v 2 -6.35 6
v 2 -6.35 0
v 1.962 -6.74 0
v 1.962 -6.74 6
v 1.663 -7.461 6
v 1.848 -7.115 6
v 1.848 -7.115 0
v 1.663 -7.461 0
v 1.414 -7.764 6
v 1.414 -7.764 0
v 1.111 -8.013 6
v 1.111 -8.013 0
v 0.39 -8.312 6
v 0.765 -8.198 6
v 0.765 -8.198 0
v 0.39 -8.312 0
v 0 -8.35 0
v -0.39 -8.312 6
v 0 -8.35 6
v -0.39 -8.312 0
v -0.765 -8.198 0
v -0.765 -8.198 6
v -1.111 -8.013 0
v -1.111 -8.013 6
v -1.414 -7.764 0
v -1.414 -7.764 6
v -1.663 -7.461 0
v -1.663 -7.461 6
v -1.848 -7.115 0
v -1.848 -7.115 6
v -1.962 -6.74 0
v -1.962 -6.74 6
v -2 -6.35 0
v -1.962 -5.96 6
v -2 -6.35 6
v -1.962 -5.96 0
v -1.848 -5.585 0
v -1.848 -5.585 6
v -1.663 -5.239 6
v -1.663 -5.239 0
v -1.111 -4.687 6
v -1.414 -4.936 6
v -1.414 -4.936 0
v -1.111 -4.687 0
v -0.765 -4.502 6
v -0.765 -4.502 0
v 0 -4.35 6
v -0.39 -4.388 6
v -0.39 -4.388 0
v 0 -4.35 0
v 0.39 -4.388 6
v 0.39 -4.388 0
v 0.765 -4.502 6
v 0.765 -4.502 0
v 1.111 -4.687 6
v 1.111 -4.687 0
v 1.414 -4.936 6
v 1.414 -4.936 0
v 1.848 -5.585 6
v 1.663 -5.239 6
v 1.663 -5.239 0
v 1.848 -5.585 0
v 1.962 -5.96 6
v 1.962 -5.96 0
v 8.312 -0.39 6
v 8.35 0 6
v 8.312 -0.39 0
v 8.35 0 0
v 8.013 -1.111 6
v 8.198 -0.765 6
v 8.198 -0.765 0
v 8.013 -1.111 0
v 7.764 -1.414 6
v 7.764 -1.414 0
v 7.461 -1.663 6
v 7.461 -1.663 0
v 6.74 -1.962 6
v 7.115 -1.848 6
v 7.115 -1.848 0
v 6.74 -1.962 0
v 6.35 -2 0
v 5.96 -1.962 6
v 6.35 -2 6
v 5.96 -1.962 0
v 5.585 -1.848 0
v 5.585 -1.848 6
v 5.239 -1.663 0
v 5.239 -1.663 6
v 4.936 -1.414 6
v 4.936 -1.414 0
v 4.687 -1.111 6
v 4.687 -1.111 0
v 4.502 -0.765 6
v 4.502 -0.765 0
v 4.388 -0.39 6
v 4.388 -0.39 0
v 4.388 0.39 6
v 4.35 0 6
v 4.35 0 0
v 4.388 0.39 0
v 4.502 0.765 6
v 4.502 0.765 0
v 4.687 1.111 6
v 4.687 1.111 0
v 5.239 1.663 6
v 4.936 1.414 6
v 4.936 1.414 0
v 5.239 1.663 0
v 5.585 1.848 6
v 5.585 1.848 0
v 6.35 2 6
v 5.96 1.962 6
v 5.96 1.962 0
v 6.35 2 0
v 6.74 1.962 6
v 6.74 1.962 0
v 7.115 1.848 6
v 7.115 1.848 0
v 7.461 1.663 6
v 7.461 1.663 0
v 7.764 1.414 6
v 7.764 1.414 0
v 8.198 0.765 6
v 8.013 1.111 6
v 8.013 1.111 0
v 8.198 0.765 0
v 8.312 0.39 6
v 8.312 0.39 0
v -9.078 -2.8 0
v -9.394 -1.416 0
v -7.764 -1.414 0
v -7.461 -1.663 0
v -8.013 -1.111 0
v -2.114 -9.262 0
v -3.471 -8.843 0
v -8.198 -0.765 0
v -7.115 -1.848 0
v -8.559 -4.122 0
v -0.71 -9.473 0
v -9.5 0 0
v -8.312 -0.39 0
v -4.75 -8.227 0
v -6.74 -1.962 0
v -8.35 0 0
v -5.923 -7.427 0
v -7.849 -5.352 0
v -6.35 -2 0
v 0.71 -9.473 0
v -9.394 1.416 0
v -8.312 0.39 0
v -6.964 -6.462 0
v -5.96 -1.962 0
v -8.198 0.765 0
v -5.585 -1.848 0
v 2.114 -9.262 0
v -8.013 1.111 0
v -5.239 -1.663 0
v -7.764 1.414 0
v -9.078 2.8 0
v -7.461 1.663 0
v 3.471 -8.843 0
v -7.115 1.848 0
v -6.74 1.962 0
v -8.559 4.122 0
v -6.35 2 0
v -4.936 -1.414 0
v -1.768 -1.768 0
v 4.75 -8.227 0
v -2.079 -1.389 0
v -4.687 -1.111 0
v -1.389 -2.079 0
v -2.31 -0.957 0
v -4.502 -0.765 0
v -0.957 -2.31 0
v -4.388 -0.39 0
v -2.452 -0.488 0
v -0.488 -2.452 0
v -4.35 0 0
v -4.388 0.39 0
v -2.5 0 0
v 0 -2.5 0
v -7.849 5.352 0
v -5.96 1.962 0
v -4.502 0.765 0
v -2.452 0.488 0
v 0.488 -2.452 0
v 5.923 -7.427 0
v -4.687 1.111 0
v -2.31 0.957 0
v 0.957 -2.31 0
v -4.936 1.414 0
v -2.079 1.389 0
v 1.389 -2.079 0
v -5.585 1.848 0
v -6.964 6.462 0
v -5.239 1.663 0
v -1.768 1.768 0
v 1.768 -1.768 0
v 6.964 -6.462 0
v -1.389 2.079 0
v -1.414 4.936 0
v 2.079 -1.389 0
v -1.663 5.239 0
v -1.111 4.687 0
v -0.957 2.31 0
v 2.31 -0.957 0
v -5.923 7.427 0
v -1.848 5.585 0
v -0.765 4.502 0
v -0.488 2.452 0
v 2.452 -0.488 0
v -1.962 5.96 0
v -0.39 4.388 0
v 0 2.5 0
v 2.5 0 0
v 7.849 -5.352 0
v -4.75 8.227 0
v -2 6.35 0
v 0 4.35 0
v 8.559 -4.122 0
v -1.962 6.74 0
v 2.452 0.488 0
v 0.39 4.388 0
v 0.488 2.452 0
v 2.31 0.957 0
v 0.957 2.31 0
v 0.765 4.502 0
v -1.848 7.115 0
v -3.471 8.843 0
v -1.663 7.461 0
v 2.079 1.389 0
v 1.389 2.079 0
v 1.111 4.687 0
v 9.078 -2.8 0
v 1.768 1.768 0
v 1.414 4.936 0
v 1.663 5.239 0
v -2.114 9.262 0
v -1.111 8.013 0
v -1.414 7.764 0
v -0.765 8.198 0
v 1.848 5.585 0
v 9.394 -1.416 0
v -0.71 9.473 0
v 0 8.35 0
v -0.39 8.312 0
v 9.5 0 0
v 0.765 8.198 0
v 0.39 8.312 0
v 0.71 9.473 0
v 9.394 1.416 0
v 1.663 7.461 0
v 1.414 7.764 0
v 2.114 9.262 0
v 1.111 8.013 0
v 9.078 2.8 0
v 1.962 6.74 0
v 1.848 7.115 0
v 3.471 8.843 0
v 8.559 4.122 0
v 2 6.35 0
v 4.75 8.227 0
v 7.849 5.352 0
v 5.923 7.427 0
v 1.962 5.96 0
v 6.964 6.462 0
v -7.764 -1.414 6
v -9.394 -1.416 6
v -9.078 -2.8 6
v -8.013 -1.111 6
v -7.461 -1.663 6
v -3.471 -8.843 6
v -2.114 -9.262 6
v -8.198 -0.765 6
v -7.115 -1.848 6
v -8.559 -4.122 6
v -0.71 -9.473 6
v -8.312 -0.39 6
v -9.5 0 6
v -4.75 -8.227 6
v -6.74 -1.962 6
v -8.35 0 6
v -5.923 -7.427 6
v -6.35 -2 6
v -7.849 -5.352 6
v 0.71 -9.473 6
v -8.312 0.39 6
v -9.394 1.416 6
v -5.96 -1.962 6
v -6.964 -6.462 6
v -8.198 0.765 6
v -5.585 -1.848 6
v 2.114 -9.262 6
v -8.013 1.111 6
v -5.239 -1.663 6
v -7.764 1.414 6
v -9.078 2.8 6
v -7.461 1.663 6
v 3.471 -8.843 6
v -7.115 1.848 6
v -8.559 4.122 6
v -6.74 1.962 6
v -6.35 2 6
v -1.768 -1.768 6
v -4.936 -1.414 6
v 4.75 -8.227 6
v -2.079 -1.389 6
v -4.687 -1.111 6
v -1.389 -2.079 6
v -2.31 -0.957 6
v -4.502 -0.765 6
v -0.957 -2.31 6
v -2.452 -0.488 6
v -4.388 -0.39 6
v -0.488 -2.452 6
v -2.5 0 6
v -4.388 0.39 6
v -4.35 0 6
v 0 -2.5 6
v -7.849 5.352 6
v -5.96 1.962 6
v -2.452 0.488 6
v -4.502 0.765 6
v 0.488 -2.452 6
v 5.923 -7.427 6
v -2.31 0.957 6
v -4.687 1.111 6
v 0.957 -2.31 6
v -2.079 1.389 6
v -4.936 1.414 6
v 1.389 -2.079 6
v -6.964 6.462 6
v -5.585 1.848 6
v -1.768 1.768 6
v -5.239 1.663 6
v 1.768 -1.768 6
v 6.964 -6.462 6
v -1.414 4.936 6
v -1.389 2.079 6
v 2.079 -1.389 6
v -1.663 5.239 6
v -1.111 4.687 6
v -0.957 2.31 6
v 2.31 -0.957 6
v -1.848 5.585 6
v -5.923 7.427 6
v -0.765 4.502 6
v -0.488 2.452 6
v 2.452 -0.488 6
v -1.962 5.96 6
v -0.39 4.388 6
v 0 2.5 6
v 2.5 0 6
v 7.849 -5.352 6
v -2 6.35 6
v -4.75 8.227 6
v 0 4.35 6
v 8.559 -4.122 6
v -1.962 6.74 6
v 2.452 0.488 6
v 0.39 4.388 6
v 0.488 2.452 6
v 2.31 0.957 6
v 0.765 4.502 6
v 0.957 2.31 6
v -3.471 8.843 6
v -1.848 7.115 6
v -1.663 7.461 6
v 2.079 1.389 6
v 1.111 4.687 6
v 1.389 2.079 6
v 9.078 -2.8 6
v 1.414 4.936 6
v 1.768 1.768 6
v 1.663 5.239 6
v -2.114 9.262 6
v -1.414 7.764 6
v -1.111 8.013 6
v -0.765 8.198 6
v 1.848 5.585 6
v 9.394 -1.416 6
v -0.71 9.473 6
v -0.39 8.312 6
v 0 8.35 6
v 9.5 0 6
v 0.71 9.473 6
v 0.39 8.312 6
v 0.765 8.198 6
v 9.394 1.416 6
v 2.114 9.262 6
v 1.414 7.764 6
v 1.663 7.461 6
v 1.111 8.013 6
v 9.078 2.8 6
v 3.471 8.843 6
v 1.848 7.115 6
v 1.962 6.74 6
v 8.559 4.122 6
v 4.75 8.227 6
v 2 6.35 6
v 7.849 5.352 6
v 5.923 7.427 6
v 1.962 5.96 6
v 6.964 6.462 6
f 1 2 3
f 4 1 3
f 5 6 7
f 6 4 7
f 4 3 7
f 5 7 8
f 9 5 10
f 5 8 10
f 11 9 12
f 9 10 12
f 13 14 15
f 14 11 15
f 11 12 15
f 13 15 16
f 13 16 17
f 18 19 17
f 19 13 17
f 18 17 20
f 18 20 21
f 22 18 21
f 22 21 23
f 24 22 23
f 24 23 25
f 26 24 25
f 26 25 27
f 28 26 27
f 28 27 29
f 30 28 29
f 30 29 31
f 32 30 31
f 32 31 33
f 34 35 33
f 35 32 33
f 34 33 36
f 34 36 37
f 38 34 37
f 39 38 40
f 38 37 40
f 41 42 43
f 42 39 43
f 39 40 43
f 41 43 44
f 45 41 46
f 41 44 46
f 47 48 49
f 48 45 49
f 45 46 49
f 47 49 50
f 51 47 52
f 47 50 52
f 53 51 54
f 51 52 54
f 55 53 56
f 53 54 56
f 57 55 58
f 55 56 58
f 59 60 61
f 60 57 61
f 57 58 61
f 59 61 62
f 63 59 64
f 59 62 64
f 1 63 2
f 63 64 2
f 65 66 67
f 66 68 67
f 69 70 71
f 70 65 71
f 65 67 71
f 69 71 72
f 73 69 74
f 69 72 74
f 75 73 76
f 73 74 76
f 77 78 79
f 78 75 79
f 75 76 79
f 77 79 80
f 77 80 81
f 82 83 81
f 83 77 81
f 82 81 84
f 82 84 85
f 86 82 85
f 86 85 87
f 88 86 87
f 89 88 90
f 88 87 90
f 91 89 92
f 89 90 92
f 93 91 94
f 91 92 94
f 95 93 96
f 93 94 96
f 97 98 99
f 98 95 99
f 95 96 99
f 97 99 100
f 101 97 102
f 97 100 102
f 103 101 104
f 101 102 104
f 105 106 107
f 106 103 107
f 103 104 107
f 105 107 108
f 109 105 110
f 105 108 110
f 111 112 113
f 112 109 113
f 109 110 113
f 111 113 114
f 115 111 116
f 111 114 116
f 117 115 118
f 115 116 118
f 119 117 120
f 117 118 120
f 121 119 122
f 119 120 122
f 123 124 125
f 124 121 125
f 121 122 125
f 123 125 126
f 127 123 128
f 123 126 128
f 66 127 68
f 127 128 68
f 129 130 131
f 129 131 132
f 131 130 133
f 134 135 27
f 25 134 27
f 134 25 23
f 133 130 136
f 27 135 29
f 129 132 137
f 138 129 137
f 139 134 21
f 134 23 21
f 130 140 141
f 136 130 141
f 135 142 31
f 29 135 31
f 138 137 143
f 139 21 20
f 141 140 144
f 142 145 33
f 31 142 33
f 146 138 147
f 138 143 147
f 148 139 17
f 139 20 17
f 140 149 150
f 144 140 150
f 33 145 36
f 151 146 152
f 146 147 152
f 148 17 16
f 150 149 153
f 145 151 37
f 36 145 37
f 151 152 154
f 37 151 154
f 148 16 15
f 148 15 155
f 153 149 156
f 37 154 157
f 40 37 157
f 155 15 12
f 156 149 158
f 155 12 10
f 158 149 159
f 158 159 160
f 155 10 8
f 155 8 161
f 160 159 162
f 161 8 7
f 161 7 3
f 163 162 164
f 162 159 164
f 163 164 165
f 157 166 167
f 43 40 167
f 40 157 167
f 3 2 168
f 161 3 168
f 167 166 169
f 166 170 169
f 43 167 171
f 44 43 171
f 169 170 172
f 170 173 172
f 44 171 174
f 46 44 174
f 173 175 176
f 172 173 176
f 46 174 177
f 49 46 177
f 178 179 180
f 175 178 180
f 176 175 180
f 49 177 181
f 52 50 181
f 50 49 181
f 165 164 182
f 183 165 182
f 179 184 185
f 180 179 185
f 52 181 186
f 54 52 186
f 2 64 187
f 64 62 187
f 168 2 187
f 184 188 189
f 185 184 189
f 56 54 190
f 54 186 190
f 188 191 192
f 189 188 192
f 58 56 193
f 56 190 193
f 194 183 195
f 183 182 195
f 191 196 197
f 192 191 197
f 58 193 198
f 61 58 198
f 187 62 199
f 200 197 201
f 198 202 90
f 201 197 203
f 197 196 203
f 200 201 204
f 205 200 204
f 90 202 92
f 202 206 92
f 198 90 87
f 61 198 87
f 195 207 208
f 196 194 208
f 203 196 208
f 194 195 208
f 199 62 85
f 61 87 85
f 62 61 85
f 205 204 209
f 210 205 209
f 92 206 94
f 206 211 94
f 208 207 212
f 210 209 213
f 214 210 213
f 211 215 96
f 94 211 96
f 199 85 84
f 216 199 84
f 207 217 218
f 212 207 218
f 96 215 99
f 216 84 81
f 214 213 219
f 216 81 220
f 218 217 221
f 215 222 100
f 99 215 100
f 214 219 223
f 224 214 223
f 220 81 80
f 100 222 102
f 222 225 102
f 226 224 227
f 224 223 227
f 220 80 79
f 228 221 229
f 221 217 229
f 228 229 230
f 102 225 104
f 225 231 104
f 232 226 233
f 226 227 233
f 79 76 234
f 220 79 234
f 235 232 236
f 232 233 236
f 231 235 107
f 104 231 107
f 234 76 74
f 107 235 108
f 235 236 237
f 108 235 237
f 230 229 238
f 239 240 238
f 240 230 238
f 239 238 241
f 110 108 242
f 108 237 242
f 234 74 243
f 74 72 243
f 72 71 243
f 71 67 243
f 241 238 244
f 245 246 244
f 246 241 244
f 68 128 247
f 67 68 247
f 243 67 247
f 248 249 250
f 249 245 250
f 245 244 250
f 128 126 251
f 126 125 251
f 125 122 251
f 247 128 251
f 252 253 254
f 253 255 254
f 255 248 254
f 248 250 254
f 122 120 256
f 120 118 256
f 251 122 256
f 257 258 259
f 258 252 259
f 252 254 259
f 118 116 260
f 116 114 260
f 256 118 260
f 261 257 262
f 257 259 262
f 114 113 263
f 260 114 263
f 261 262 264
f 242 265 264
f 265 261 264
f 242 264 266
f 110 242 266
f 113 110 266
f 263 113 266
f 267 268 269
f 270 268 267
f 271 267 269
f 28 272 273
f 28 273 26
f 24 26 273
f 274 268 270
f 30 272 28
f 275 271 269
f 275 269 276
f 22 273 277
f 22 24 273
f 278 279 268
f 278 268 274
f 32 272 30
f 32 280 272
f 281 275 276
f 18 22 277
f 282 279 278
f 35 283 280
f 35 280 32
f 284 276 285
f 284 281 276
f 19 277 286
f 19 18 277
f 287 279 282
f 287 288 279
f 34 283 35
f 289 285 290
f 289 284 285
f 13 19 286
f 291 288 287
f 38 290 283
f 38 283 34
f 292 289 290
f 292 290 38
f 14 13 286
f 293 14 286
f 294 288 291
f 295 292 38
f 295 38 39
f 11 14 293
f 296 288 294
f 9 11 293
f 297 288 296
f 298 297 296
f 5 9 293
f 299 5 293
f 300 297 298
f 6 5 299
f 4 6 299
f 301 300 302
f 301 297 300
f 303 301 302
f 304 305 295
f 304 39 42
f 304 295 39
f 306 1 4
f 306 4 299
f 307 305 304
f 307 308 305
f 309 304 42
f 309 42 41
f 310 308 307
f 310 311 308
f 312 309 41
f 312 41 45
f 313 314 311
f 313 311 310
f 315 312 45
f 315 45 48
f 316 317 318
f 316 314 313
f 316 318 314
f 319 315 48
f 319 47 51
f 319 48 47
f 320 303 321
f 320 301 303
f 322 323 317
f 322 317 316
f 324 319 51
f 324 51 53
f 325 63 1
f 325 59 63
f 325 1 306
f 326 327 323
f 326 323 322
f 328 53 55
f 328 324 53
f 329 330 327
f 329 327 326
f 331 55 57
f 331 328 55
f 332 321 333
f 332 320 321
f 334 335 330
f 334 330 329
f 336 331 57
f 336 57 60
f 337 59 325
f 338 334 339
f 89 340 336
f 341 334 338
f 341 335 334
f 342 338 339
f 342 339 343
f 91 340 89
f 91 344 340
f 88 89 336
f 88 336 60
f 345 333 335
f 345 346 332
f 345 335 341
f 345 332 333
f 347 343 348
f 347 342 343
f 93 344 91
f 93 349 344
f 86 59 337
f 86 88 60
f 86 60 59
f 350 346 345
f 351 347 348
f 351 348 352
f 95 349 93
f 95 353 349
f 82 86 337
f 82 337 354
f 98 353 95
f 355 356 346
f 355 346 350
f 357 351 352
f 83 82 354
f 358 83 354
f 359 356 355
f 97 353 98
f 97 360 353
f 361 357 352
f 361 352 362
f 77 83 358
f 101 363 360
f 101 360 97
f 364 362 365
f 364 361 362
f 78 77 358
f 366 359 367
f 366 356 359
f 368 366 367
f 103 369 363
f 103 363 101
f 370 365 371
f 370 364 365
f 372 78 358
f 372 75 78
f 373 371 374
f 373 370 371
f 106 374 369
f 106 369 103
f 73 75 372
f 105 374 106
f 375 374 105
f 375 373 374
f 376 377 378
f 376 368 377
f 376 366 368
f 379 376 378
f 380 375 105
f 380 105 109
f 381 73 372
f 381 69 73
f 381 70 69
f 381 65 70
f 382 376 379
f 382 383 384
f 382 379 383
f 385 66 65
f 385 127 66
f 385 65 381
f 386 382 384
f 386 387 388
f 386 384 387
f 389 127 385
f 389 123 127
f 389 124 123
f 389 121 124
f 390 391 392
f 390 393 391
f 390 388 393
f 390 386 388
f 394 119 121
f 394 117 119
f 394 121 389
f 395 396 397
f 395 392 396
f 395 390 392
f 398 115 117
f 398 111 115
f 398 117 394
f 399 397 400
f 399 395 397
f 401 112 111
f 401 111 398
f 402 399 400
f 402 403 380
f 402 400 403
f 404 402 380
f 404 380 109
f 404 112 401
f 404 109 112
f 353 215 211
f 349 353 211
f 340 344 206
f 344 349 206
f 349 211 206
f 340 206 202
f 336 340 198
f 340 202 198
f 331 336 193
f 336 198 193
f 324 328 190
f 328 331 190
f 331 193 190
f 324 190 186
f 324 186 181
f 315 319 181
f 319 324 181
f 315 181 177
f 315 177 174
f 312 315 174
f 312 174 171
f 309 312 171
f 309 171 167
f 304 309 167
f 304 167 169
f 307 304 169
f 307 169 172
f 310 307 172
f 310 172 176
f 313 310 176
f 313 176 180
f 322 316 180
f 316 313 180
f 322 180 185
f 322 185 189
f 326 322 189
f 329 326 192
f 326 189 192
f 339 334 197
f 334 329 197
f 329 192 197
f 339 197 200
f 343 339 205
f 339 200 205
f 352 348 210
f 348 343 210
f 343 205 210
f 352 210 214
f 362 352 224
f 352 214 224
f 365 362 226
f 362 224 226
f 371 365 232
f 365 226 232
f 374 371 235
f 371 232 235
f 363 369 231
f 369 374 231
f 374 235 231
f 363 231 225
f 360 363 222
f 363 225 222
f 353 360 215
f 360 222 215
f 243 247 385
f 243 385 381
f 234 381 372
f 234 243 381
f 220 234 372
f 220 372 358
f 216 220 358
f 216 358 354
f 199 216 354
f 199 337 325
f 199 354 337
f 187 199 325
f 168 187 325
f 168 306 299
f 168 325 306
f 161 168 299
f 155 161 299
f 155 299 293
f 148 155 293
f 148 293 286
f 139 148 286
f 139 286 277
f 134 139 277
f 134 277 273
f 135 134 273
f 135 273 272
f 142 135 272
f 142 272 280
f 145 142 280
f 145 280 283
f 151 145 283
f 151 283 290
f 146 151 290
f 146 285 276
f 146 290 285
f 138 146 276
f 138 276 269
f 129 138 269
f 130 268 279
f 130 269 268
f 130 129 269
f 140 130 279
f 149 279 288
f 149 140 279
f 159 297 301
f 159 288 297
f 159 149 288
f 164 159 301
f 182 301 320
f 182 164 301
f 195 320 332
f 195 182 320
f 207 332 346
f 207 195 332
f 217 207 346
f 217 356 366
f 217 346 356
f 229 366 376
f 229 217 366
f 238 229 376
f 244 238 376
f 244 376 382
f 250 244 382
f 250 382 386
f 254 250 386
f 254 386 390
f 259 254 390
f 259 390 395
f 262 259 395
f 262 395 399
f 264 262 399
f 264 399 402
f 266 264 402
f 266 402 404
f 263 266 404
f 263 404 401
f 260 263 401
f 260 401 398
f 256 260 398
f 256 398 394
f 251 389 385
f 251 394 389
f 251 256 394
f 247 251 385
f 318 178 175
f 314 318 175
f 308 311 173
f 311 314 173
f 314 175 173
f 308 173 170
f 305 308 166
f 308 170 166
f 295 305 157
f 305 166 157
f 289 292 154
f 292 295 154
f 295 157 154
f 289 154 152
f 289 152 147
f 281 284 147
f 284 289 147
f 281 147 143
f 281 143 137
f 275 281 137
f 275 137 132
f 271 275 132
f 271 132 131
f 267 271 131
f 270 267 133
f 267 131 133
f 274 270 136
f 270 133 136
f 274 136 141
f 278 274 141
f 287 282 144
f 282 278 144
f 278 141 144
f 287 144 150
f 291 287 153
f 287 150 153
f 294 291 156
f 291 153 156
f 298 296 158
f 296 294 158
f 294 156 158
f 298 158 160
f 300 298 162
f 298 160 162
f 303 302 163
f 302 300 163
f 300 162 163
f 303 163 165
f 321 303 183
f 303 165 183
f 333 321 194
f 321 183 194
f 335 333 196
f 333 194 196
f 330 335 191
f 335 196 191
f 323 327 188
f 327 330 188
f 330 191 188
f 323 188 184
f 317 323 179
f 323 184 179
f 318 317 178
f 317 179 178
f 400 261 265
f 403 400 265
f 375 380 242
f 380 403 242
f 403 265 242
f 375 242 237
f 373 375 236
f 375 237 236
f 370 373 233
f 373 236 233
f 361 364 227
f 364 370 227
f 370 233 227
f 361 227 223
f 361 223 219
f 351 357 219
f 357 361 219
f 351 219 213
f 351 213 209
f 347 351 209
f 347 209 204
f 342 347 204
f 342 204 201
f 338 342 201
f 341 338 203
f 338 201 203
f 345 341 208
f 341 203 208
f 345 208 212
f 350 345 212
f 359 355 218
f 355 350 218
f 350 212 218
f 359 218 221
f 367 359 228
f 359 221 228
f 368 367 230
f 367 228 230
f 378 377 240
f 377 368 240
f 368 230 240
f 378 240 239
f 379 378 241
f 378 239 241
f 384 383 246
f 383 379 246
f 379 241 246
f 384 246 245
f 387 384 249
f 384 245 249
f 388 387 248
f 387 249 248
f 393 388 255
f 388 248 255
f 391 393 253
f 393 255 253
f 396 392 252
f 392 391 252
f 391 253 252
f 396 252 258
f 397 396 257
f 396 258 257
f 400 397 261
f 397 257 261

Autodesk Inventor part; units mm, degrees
ref_plane "YZ Plane" through (0, 0, 0) normal (1, 0, 0) x (0, 1, 0)
ref_plane "XZ Plane" through (0, 0, 0) normal (0, 1, 0) x (-1, 0, 0)
ref_plane "XY Plane" through (0, 0, 0) normal (0, 0, 1) x (1, 0, 0)
sketch "Sketch1" plane through (0, 0, 0) normal (0, 0, 1) x (1, 0, 0)
  circle A0 centre (0, 0) radius 9.5
  circle A1 centre (0, 0) radius 2.5
  circle A2 centre (6.35, 0) radius 2
  circle A3 centre (0, 6.35) radius 2
  circle A4 centre (-6.35, 0) radius 2
  circle A5 centre (0, -6.35) radius 2
  dimension "d0" = 19
  dimension "d1" = 5
  dimension "d2" = 4
  dimension "d3" = 6.35
  dimension "d6" = 360
extrude "Extrusion1" add sketch "Sketch1" along normal blind 6
properties part number "HA015" material "ABS Plastic"
